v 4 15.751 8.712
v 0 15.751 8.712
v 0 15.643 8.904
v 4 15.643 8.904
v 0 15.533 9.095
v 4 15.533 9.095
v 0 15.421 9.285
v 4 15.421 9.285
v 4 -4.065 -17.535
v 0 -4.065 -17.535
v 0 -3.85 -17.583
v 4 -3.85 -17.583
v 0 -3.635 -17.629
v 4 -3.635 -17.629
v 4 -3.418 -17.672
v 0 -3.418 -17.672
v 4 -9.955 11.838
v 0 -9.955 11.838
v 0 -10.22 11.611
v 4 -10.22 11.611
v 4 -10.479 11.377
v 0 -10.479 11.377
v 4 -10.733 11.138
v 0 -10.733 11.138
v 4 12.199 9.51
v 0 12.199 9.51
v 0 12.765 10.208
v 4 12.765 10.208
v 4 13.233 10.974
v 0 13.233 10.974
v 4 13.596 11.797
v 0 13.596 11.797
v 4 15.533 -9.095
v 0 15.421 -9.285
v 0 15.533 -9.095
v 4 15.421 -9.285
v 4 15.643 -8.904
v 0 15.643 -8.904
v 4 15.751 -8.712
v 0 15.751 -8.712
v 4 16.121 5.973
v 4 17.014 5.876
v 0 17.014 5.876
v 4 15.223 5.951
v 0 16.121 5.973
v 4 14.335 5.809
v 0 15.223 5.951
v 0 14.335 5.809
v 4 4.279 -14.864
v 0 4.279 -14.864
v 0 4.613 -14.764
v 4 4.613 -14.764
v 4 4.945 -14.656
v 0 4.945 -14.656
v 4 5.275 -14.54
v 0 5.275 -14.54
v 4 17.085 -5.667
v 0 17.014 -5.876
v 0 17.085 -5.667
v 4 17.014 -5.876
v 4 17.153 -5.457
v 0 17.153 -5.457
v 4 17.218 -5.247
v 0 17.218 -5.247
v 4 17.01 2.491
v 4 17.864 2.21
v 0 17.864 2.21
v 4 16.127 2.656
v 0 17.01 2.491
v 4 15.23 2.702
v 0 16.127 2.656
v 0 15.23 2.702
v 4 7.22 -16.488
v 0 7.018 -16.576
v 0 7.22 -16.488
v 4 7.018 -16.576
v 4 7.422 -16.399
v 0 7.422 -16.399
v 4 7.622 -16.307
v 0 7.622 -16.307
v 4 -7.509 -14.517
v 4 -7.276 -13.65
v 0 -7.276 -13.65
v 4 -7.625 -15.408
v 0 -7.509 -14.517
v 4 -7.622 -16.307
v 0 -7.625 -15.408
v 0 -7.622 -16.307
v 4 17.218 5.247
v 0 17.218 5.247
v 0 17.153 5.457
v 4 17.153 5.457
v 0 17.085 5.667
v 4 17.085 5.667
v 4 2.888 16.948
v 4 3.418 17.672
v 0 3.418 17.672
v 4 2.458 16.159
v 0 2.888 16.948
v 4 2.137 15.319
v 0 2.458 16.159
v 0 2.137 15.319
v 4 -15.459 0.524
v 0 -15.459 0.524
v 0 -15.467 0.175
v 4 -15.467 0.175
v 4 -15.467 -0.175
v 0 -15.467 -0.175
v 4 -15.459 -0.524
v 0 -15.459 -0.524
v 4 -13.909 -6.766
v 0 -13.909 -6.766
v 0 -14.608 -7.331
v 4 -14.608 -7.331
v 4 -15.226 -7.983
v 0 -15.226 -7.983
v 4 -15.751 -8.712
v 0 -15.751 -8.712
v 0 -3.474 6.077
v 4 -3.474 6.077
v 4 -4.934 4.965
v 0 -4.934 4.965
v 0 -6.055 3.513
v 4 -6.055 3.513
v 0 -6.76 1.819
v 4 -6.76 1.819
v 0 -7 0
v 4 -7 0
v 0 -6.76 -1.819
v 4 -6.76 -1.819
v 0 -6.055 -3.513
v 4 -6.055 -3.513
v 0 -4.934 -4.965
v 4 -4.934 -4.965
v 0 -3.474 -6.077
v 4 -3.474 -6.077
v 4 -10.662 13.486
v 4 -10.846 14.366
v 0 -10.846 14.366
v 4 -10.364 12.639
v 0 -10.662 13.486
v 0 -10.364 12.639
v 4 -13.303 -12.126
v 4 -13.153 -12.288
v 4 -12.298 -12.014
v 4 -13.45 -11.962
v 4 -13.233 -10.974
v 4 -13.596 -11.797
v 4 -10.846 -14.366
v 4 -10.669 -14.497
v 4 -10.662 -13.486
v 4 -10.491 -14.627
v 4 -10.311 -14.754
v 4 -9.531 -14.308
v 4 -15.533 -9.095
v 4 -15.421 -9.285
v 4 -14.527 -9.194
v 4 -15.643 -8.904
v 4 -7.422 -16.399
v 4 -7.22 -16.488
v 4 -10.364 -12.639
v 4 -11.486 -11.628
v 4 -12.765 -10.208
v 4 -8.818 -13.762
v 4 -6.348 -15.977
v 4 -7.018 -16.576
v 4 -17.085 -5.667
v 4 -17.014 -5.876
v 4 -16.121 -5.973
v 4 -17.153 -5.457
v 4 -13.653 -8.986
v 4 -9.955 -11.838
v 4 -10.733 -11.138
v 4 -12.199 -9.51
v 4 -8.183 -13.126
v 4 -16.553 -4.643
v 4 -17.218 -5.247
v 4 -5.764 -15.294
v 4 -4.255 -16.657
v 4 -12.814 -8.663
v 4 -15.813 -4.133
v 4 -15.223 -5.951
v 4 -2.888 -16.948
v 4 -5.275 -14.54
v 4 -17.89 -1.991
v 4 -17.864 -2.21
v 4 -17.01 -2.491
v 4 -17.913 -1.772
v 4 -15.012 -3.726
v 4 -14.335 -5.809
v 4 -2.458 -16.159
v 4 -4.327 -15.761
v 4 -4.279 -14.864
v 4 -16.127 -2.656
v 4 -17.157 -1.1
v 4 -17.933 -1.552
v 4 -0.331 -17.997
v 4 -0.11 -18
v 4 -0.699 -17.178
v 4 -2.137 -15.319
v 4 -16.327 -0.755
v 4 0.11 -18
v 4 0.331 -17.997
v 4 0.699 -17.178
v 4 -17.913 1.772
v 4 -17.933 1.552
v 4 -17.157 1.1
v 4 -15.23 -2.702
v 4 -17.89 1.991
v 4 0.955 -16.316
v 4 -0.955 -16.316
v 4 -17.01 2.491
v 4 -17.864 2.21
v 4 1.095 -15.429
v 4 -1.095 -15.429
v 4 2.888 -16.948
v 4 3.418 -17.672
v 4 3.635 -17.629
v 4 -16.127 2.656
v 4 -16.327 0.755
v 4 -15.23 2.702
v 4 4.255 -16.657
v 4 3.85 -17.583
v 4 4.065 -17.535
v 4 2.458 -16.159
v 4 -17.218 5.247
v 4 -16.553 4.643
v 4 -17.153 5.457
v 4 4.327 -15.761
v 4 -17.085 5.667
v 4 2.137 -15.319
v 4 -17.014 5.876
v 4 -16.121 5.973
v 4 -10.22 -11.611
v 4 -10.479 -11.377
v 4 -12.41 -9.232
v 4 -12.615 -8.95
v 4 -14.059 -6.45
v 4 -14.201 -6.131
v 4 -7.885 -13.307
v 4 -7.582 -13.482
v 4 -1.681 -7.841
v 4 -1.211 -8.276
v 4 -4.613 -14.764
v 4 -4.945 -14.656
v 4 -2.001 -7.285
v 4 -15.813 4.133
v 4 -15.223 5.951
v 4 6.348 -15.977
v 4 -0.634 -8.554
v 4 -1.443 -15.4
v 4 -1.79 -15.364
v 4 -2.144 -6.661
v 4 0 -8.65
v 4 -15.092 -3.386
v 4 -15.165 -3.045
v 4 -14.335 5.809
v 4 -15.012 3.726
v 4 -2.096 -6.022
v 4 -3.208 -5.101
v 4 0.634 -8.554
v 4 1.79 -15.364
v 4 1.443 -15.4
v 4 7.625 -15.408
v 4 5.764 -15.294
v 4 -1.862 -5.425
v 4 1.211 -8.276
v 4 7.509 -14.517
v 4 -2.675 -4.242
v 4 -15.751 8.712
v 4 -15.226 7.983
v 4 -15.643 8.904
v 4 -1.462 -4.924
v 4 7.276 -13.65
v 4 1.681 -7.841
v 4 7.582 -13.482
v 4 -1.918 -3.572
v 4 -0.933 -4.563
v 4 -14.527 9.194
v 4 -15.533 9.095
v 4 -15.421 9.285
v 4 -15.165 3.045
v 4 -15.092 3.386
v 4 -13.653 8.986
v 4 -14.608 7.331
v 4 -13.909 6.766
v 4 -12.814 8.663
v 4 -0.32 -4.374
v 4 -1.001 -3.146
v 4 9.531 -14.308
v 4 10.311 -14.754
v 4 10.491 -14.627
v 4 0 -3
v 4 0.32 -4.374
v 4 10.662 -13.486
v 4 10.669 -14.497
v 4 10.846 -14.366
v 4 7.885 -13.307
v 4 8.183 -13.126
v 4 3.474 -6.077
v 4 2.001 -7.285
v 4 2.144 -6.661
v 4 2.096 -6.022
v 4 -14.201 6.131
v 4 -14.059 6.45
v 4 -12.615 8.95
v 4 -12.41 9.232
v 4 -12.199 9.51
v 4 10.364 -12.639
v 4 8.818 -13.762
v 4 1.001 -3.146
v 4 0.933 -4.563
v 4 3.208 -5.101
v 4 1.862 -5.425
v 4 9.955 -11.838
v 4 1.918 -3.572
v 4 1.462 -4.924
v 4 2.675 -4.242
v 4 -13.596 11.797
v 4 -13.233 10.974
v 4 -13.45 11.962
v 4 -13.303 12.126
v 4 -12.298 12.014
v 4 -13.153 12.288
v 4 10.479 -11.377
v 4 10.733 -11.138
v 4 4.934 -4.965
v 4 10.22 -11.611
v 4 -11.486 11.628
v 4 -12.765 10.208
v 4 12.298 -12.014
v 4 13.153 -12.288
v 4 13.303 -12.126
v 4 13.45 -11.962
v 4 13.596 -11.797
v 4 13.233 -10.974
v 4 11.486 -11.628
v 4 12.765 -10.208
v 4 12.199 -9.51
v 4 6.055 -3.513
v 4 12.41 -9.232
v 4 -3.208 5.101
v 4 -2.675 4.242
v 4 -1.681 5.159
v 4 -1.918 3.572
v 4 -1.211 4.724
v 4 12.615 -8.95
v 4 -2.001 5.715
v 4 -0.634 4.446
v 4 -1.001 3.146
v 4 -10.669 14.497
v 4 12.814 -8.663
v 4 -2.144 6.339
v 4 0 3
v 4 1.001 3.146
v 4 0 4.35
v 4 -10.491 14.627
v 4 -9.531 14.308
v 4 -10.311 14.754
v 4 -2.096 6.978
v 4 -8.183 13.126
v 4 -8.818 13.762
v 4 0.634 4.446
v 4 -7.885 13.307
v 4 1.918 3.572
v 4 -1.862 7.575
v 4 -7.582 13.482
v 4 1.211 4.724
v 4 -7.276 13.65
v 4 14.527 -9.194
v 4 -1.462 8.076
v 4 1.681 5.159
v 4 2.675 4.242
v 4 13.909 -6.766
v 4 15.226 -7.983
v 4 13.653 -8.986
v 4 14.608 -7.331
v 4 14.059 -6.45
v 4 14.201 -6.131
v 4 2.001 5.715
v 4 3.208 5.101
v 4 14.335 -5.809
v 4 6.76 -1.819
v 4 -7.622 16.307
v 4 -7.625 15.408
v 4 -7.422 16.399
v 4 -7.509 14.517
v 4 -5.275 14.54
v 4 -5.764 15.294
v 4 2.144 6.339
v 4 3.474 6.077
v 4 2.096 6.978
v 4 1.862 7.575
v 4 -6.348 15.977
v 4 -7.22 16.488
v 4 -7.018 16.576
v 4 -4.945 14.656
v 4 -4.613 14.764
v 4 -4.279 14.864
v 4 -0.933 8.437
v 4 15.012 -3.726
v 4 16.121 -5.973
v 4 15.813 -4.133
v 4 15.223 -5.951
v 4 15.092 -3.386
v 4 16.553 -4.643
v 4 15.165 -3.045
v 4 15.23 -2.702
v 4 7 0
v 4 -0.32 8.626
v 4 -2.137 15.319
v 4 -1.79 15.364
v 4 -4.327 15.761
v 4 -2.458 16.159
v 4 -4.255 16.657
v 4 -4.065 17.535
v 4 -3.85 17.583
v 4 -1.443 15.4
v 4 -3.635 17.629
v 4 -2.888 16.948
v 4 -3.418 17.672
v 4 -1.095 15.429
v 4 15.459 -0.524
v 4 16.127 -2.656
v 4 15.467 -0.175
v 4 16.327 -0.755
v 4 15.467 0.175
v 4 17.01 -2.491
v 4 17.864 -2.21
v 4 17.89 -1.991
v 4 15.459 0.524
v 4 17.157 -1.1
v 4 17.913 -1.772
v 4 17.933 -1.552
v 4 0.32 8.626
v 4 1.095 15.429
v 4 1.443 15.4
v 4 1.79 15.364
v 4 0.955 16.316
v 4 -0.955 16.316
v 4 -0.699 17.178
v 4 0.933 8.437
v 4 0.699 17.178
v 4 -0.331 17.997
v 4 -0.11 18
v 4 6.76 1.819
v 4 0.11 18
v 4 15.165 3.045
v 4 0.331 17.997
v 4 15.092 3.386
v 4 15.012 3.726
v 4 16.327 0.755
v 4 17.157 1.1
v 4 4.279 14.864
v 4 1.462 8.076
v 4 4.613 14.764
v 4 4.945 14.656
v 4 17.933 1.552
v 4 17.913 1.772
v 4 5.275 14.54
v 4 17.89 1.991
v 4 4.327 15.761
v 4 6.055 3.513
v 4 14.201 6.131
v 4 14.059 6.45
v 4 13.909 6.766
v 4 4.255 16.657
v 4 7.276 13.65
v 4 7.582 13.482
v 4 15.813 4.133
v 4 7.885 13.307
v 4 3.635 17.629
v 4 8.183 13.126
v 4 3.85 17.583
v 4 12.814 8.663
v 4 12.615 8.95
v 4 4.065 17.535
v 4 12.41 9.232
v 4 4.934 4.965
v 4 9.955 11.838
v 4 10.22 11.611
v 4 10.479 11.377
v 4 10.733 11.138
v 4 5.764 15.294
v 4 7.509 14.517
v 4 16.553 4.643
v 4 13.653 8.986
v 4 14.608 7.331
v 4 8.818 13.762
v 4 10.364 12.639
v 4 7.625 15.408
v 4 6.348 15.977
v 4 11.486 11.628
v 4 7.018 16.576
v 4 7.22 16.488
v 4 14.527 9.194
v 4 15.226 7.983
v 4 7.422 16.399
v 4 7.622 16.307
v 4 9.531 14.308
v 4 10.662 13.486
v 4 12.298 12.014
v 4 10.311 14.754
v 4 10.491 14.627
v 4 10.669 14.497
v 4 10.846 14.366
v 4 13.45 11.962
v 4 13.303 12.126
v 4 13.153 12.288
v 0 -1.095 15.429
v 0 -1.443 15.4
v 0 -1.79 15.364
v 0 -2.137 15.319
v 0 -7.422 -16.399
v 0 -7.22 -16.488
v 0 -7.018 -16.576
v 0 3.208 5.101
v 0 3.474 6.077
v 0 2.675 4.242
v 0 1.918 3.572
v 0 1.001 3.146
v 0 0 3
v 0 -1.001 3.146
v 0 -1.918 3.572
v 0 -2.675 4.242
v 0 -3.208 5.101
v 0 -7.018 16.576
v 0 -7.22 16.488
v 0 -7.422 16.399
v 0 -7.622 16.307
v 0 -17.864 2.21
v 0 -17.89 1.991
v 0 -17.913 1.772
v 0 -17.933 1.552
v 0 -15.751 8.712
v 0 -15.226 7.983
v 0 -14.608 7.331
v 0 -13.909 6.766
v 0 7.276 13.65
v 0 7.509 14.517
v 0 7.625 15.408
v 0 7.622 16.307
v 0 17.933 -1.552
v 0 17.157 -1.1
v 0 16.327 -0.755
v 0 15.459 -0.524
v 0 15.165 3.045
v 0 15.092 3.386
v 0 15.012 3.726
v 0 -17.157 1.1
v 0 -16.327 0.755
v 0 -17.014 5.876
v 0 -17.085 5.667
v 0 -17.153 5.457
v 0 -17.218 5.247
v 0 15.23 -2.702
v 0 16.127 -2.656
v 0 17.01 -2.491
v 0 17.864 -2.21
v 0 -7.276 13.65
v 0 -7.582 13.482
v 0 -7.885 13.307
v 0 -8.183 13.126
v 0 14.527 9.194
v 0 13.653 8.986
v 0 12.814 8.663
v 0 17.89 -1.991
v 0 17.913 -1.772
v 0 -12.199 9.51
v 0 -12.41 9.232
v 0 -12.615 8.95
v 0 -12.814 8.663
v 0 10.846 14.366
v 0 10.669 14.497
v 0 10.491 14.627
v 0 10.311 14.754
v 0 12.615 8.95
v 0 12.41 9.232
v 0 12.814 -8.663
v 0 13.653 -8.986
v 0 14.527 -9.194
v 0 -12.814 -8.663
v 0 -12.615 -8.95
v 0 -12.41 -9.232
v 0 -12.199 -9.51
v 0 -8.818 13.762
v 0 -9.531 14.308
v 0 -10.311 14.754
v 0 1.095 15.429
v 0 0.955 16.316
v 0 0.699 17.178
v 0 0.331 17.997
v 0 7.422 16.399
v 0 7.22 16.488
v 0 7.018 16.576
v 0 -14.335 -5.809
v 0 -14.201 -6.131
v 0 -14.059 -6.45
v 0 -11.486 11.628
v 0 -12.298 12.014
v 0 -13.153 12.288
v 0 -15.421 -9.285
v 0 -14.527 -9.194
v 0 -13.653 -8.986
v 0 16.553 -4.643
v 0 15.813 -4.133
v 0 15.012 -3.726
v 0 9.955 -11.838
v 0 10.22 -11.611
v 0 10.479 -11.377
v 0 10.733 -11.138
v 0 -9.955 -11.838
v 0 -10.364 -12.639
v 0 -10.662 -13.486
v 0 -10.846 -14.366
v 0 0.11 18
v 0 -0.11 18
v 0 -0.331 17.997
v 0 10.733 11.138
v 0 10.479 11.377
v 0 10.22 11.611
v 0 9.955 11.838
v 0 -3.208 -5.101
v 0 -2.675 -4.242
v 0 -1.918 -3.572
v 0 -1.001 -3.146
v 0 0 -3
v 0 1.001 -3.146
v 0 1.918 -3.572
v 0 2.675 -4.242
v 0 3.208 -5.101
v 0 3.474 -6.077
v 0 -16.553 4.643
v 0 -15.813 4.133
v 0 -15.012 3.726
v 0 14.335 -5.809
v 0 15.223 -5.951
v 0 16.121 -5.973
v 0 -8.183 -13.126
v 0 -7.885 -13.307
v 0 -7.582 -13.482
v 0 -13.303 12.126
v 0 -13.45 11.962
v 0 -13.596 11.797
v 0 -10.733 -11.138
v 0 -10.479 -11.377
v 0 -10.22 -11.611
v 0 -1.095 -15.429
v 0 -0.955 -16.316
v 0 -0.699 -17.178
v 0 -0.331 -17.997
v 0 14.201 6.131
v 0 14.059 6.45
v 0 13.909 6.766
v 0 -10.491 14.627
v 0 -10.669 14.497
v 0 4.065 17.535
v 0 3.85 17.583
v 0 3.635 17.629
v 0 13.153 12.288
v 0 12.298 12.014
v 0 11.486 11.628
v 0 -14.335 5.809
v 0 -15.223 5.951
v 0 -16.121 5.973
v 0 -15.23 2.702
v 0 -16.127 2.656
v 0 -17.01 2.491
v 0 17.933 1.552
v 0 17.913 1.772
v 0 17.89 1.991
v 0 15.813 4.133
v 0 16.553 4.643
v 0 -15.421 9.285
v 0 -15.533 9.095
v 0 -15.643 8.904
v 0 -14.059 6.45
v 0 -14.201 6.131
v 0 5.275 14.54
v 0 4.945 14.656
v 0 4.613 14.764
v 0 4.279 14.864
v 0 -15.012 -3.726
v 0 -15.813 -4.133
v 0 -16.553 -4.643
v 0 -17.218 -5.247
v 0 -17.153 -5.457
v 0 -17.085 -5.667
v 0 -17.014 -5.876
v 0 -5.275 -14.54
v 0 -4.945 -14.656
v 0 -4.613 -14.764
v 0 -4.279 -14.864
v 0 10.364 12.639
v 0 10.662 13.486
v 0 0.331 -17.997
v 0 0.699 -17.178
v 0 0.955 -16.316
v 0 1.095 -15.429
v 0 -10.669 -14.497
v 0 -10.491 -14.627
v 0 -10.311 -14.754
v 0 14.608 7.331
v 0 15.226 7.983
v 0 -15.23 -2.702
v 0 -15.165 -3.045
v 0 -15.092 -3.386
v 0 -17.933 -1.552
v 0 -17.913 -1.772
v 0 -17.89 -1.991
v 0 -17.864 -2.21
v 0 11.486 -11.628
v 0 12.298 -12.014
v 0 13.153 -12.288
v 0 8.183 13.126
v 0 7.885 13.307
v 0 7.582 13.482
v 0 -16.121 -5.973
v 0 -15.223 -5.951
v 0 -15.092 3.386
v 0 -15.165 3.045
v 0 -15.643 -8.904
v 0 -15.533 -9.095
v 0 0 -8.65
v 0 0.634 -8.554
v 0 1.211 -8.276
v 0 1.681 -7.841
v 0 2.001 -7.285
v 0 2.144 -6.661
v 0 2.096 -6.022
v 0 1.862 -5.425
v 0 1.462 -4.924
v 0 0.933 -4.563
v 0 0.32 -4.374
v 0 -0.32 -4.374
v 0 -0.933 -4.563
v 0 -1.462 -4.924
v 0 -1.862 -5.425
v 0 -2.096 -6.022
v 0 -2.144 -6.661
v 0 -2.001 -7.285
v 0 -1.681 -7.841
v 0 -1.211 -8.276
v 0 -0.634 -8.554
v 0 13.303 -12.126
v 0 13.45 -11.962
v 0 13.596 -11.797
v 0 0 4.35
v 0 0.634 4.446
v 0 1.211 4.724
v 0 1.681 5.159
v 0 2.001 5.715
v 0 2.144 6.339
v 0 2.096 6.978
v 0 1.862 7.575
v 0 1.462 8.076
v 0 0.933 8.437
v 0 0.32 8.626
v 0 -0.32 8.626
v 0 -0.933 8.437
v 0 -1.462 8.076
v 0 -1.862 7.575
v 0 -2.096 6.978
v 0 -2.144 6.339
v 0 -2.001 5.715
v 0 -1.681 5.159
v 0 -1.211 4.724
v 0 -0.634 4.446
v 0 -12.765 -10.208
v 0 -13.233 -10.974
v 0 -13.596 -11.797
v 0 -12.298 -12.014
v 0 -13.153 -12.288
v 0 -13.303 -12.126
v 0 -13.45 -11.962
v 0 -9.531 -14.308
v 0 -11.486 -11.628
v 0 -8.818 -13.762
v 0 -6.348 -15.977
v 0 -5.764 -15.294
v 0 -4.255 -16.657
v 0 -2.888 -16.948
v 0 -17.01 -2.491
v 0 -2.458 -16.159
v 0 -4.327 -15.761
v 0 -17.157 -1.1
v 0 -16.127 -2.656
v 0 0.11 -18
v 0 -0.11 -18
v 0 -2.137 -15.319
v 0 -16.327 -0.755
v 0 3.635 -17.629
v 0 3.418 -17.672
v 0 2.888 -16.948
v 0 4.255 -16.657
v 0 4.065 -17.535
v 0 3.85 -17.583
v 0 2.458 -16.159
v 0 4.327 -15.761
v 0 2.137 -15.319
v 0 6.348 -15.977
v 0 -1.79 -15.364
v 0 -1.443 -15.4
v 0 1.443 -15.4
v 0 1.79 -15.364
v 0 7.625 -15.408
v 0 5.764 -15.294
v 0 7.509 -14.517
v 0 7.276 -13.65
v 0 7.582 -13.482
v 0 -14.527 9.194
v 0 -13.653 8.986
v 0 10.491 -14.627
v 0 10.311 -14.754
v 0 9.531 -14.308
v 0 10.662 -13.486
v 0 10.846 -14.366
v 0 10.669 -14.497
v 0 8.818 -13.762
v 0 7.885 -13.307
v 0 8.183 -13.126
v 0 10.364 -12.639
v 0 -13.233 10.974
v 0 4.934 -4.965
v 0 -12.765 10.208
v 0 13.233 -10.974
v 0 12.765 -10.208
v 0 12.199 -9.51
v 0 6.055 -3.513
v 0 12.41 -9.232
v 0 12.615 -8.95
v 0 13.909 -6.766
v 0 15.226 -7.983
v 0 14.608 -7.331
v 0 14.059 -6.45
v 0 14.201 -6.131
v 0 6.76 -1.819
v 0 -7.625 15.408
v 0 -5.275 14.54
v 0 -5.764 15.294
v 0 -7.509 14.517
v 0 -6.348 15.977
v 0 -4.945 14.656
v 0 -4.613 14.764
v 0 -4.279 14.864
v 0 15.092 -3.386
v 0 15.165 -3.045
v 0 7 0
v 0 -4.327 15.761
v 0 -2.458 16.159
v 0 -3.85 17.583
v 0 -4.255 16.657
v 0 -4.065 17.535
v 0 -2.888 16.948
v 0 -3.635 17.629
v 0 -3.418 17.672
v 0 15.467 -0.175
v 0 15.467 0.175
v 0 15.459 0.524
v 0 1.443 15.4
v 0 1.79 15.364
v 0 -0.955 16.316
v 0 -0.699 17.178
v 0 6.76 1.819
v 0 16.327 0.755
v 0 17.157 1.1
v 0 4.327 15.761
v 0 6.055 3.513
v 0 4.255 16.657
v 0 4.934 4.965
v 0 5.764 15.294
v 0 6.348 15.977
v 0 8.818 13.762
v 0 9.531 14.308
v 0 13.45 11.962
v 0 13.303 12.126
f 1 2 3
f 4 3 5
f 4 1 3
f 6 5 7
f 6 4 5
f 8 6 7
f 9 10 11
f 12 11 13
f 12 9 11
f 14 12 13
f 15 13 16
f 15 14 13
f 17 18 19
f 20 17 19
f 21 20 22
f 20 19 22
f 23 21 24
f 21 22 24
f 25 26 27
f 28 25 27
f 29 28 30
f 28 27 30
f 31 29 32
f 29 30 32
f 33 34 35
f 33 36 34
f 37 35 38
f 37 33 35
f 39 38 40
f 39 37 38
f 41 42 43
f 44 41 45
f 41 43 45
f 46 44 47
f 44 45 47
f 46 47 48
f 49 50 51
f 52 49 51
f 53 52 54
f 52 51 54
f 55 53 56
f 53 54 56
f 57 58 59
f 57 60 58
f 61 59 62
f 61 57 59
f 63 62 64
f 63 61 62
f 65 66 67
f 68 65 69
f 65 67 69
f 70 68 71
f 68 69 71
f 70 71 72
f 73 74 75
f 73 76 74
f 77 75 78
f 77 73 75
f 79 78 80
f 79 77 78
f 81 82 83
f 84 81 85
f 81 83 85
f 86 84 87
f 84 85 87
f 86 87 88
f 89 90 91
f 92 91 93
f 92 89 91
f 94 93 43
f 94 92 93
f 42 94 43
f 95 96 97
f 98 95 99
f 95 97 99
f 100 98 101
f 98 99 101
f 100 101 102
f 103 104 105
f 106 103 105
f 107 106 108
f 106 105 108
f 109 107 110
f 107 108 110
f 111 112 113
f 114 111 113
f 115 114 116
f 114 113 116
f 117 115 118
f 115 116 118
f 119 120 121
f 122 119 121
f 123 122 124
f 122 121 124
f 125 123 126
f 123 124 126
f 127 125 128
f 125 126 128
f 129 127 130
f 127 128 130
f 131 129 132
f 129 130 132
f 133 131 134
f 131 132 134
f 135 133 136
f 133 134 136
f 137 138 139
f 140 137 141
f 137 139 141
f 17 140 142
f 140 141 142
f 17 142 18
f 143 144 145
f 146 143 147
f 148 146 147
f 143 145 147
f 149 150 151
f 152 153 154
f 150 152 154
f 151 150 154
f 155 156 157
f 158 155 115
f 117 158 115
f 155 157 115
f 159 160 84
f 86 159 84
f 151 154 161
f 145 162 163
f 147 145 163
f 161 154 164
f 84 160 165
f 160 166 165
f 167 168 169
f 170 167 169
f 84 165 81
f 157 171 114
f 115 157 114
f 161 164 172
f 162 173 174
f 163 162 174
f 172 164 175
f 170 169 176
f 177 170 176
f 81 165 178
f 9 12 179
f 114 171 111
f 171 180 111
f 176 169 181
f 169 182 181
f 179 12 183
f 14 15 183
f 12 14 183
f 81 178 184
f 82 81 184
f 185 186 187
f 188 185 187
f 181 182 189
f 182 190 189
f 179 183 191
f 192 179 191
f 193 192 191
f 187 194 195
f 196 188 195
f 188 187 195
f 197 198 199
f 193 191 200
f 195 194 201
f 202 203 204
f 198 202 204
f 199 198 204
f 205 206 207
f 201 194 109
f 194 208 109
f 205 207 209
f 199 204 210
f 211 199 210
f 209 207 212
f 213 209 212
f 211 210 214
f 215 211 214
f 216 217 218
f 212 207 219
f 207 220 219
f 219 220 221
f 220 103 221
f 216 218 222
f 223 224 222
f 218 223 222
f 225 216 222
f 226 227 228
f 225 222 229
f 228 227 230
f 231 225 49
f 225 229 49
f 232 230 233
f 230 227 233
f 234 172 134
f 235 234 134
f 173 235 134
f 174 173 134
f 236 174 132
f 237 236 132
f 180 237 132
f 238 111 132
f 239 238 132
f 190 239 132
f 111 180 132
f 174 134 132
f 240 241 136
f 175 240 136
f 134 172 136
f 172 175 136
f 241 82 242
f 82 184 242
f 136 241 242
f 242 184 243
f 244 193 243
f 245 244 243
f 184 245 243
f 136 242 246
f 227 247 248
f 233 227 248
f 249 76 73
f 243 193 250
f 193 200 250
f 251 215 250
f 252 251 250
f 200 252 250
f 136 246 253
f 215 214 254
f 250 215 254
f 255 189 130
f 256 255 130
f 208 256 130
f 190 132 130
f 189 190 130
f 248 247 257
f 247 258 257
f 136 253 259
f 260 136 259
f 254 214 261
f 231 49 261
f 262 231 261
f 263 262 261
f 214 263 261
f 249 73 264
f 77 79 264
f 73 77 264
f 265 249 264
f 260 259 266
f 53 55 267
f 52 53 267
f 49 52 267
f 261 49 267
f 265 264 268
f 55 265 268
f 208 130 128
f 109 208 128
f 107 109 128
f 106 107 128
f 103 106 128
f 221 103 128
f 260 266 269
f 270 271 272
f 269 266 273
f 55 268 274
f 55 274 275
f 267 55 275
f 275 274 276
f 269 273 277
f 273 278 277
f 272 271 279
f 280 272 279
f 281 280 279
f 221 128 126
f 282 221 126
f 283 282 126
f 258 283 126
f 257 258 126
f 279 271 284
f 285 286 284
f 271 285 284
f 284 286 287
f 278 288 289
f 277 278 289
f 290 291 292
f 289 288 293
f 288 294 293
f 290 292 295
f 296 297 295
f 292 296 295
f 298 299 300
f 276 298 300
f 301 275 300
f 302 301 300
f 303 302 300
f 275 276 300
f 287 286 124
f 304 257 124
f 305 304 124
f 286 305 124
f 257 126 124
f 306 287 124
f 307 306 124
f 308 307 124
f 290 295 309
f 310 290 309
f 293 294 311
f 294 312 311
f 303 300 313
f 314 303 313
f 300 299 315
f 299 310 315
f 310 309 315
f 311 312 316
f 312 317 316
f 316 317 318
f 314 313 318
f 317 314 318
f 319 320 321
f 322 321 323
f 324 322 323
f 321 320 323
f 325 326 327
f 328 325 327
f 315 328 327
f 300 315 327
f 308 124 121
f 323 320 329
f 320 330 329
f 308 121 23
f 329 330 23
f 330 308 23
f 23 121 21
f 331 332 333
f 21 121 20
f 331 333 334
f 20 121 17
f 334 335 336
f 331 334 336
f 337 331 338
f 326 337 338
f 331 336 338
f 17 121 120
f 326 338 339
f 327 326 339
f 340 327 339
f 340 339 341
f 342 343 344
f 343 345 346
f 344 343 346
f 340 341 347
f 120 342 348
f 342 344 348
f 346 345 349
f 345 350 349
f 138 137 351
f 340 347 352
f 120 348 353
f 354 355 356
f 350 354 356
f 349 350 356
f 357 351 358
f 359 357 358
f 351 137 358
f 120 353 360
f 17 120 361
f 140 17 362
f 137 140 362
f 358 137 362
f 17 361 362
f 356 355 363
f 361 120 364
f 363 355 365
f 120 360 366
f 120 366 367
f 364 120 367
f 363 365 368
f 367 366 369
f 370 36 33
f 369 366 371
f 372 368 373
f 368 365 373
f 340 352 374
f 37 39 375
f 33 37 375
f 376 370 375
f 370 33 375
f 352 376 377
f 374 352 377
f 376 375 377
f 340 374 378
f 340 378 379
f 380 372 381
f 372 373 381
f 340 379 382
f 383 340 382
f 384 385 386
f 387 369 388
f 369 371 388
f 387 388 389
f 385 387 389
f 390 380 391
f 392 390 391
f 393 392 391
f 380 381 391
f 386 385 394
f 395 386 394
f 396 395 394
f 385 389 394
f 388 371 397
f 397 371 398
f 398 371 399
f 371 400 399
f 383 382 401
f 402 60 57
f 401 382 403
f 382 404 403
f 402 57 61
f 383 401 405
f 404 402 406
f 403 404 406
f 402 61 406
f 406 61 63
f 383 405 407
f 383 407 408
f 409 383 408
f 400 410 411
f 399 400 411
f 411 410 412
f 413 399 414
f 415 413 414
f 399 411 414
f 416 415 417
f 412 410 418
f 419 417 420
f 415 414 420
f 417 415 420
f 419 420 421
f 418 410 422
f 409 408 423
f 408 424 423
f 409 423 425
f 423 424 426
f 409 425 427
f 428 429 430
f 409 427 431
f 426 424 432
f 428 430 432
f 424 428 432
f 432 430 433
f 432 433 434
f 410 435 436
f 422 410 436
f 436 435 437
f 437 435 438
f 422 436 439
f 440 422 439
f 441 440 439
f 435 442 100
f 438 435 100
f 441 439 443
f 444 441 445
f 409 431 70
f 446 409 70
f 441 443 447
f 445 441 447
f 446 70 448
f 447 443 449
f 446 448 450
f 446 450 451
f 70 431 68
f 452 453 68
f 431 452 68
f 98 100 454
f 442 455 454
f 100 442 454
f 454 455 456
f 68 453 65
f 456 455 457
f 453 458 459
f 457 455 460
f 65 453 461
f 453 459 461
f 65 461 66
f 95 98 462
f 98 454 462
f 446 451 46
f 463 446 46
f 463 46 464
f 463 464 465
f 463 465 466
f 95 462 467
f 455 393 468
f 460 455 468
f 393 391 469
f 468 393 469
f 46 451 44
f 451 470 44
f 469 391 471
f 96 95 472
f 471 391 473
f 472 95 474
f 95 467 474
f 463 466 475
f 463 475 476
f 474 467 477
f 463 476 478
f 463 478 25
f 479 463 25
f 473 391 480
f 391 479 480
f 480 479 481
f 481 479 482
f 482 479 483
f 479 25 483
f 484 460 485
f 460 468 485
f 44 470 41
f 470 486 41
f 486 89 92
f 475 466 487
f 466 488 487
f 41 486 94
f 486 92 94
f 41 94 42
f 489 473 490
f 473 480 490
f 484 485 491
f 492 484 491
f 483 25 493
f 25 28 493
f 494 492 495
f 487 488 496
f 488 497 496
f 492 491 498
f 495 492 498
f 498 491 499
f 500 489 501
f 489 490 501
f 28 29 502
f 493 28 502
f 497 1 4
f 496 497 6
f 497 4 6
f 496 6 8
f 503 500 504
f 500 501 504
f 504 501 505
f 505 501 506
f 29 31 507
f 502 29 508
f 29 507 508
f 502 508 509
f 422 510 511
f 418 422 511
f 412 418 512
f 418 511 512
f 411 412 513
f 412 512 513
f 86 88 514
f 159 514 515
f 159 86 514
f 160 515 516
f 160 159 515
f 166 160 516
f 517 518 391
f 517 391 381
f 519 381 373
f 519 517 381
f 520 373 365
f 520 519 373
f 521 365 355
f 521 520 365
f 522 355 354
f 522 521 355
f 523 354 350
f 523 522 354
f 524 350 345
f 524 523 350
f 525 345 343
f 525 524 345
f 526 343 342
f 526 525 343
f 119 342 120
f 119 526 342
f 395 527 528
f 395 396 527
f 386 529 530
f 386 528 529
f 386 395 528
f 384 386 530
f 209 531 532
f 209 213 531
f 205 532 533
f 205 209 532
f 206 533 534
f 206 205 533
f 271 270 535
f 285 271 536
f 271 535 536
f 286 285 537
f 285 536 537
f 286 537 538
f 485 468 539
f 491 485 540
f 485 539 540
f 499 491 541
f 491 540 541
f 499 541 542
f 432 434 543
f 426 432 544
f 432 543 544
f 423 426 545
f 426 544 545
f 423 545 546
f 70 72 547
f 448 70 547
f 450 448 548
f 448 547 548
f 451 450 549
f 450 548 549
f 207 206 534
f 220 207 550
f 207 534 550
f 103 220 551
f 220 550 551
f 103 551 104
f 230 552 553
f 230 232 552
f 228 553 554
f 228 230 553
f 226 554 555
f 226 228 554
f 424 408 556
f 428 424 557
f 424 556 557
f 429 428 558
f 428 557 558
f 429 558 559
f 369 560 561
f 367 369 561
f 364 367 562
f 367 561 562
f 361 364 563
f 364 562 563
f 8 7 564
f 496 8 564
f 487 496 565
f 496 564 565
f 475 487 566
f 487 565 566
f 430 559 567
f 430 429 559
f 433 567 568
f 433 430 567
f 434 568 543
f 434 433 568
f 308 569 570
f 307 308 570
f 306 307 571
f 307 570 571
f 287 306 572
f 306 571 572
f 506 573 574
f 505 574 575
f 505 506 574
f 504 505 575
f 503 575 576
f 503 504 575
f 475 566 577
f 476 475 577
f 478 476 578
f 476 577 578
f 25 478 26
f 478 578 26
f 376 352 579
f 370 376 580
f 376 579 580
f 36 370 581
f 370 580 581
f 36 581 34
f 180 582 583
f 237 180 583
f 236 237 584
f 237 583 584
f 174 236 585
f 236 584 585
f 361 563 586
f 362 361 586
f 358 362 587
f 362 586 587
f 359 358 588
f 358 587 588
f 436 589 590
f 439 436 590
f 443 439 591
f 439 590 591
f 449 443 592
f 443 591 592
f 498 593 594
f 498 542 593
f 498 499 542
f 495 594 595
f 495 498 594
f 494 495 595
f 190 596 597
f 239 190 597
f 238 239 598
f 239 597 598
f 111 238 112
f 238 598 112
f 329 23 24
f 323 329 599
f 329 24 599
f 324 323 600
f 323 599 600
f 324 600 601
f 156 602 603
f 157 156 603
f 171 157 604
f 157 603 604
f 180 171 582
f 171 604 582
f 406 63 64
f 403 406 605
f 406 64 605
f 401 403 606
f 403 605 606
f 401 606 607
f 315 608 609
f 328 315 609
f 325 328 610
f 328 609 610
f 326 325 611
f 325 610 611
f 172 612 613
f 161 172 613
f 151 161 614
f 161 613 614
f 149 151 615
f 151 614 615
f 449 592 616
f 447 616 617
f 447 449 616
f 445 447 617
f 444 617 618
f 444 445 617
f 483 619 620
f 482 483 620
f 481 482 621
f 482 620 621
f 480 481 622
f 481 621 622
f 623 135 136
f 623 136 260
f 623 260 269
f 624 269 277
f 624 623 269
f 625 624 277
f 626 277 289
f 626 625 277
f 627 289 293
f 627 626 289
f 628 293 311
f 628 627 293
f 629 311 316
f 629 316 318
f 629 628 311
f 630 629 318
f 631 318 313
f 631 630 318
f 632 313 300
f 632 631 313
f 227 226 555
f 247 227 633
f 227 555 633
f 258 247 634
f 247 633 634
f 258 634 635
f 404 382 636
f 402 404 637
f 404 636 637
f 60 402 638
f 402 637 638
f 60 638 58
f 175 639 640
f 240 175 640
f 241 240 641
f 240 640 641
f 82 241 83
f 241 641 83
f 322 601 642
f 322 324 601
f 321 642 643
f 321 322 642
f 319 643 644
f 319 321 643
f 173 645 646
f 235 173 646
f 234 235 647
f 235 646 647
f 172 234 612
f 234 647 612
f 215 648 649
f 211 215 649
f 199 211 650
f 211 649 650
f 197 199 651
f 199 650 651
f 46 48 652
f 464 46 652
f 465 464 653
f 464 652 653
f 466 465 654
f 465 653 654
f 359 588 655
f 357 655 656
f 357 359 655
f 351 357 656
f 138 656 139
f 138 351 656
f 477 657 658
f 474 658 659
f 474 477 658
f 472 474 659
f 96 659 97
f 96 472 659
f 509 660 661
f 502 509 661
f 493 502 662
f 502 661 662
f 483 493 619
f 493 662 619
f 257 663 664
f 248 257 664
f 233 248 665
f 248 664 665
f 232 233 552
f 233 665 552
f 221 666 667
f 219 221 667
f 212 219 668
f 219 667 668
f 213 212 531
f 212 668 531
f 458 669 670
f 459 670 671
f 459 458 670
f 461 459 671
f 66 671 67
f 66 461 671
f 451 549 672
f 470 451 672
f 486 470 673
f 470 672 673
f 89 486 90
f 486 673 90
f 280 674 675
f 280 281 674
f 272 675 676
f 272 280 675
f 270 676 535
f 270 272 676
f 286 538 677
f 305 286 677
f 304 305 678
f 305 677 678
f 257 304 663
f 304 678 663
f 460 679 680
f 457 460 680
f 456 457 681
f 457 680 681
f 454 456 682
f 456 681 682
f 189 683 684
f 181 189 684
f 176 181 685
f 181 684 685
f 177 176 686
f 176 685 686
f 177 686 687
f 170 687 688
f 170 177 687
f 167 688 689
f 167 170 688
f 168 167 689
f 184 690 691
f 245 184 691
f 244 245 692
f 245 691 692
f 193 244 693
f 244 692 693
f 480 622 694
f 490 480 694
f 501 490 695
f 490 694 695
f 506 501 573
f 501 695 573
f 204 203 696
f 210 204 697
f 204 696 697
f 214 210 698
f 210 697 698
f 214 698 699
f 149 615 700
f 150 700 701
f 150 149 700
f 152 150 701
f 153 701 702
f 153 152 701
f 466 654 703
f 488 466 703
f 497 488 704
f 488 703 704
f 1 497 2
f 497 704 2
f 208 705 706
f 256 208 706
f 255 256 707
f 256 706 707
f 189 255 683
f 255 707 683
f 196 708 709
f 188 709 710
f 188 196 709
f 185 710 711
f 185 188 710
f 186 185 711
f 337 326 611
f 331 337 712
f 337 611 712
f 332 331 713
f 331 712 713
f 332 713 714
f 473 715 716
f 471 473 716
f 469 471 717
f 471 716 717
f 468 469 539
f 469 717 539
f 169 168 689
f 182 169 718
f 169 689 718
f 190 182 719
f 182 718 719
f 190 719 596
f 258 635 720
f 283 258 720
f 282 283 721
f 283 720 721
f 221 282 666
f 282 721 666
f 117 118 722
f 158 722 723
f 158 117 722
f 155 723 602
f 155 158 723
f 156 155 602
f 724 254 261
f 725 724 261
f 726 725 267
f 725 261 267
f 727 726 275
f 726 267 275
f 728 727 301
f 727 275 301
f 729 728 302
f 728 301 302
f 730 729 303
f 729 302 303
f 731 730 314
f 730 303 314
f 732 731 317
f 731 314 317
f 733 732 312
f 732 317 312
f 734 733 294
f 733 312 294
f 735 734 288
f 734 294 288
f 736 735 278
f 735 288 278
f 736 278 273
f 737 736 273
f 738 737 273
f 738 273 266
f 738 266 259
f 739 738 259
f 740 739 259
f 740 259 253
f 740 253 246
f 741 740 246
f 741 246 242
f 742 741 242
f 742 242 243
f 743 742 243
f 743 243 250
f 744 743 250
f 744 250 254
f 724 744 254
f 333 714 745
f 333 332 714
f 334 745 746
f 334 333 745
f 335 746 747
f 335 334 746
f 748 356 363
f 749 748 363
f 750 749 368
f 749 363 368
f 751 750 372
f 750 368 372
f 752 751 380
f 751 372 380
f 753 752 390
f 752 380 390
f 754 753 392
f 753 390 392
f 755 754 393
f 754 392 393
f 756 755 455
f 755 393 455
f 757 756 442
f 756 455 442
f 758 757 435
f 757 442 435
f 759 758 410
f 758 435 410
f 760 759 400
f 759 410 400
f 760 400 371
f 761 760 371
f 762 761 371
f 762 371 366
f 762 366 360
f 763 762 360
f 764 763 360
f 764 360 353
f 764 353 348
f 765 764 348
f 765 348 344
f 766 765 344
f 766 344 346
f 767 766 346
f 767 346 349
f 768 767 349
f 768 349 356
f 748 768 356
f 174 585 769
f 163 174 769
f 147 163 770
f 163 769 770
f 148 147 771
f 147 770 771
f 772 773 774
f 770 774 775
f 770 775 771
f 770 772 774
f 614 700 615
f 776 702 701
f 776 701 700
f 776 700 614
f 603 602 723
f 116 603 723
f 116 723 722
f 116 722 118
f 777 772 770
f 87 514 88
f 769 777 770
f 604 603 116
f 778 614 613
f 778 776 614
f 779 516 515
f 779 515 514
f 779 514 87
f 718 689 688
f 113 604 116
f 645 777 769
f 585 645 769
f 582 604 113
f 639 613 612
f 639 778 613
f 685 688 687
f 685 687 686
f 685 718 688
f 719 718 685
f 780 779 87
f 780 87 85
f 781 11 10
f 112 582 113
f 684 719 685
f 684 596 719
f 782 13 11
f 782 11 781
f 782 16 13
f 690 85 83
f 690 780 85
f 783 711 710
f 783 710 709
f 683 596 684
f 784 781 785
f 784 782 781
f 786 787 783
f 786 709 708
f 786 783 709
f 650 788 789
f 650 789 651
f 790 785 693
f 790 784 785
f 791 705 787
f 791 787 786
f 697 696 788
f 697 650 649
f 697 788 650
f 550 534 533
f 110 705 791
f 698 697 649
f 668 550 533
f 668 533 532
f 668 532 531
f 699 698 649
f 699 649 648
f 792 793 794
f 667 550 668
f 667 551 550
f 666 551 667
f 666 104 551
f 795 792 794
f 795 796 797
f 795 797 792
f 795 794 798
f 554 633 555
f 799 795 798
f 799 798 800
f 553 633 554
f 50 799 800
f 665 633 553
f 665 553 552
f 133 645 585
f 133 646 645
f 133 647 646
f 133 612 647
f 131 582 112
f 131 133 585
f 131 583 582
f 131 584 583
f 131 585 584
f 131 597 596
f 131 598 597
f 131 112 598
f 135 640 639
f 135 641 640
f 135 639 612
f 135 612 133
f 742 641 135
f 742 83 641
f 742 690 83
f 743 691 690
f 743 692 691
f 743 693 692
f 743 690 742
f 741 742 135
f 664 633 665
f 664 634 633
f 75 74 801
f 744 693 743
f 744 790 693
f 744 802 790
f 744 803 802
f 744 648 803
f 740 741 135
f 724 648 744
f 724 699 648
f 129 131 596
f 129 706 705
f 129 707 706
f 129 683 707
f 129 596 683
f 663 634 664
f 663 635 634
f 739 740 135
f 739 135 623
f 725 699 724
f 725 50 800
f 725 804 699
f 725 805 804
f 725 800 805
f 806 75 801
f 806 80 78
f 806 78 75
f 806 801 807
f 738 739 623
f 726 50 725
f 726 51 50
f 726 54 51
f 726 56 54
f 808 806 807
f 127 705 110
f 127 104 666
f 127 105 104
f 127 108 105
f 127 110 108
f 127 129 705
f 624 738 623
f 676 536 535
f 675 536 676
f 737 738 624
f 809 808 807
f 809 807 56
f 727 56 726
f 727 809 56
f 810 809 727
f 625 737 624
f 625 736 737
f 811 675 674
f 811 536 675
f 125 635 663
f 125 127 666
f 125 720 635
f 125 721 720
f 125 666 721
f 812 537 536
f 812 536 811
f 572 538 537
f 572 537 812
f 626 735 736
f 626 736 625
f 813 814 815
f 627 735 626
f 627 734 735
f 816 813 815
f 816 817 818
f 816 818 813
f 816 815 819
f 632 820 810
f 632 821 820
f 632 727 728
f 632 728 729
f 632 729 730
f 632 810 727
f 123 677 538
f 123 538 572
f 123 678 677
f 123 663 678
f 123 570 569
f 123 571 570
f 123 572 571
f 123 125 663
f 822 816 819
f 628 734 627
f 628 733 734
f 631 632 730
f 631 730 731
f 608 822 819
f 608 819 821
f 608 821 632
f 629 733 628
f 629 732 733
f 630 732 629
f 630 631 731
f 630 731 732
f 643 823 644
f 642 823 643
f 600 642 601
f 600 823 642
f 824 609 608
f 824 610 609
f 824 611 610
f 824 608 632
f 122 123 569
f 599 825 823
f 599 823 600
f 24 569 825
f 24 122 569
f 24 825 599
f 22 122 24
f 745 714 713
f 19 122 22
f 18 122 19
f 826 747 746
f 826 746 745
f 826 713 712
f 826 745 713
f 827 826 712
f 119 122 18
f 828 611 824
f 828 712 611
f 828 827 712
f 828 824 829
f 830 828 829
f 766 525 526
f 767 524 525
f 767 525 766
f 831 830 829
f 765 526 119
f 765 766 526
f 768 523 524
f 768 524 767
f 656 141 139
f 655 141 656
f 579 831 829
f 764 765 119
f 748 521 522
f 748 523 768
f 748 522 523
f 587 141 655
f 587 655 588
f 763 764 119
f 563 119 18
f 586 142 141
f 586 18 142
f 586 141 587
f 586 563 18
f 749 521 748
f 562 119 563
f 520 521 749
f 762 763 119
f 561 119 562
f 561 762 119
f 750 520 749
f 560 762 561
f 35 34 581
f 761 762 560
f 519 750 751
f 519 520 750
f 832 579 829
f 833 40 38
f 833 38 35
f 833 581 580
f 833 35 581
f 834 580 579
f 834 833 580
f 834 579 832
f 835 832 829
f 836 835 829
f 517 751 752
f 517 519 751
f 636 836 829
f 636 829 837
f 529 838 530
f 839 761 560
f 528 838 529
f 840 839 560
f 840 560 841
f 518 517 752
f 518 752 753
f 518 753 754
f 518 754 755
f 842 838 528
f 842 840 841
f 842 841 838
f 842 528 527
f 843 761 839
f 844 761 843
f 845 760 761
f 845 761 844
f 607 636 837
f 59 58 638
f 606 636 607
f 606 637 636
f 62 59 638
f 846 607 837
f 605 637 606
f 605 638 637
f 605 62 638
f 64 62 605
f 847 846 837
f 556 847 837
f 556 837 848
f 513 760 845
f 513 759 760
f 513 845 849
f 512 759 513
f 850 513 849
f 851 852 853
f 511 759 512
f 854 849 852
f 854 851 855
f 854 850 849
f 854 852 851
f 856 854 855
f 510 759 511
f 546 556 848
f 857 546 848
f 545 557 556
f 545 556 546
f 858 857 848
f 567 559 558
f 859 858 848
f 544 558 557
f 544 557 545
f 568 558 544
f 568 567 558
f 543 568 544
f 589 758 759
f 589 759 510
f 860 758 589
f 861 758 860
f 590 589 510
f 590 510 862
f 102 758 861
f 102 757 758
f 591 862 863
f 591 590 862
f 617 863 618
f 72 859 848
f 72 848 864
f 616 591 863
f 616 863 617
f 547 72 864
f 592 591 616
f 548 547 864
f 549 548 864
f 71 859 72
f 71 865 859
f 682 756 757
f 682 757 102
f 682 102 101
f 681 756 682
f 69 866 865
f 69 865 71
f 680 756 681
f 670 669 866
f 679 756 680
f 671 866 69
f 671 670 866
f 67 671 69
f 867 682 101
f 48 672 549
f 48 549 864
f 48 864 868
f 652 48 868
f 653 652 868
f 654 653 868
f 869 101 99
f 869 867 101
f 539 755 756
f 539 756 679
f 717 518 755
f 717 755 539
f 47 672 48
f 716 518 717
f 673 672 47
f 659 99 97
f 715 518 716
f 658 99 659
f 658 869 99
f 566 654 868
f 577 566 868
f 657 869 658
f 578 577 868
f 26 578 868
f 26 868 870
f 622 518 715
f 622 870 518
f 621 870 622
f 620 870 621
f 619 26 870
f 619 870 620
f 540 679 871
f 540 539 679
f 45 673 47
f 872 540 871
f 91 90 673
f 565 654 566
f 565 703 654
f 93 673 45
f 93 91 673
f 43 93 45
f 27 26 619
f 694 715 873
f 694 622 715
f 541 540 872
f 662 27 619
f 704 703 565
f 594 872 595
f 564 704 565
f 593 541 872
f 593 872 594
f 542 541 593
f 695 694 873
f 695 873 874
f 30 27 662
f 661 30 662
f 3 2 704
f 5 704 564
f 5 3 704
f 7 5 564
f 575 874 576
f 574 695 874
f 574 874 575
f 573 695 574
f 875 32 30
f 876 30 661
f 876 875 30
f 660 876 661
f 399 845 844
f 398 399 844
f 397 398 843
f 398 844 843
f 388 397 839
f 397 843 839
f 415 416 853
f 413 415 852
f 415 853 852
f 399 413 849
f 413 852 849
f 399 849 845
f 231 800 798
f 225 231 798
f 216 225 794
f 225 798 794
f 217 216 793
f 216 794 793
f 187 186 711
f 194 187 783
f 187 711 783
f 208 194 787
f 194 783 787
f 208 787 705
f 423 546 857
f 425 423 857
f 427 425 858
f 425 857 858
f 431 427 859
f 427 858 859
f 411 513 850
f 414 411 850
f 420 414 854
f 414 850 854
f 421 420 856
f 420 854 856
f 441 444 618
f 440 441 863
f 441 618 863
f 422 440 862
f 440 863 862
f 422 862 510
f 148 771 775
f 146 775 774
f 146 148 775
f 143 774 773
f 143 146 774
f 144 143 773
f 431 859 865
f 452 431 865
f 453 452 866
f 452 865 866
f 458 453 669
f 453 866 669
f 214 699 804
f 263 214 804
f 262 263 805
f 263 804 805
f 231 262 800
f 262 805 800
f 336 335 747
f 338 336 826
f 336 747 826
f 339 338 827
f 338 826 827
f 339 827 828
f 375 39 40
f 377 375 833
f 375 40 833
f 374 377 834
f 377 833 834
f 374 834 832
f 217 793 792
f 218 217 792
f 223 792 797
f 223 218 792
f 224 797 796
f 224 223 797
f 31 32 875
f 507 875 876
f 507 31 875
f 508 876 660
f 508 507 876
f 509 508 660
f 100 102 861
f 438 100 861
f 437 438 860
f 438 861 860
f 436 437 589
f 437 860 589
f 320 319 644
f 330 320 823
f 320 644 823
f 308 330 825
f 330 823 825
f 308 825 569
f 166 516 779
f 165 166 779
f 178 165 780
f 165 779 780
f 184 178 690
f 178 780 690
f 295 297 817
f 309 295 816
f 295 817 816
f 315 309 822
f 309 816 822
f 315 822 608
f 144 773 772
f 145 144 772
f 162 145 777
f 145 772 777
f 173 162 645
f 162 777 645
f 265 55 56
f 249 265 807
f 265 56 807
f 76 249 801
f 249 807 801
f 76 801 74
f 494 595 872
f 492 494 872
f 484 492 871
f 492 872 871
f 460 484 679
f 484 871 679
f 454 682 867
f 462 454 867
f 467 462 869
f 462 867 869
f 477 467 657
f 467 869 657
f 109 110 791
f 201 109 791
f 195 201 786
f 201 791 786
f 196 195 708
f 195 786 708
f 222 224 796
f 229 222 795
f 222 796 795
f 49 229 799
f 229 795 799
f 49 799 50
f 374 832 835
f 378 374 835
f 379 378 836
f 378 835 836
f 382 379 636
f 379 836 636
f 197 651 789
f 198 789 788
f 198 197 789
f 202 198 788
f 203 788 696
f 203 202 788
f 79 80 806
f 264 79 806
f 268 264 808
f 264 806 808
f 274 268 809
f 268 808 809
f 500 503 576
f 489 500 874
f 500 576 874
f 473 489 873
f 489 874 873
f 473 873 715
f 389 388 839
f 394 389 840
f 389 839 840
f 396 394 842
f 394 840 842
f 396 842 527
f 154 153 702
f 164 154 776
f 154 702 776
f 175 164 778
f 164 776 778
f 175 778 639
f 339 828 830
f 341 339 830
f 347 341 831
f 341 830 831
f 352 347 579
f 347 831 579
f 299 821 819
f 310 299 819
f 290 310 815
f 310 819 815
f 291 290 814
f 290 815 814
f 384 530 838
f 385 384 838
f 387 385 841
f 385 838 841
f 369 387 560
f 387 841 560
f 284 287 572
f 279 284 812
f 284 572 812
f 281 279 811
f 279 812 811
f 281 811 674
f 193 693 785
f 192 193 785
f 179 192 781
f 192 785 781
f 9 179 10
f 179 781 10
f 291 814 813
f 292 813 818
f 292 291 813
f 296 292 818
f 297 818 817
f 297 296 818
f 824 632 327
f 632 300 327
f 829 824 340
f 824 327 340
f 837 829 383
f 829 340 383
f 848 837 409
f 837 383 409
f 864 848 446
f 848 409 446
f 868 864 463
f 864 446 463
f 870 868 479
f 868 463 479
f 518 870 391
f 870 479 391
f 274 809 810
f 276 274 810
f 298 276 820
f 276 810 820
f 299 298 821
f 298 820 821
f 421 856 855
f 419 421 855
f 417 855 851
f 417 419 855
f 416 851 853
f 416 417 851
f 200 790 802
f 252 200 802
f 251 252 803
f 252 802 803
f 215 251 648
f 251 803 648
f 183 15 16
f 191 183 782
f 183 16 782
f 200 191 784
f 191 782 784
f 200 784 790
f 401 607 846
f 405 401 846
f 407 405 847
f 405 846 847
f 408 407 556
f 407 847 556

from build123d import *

# Parameters (mm, degrees)
BASPROSKE_W          = 4
BASPROSKE_H          = 18
TOOTHCUT_DEPTH       = 26.768197453
TEETHCUTS_COUNT      = 30
TEETHCUTS_ANGLE      = 348
BORSKE_R             = 7
BORE_DEPTH           = 50.0000508
SKETCH2_R            = 3.5
BOSS_EXTRUDE1_DEPTH  = 4
M4_CLEARANCE_HOLE1_D = 4.3


with BuildPart() as part:
    # BasProSke → Base-Revolve (revolve)
    with BuildSketch(Plane(origin=(0, 0, 0), x_dir=(1, 0, 0), z_dir=(0, 1, 0)), mode=Mode.PRIVATE) as base_revolve_sk:
        with Locations((2, 9)):
            Rectangle(BASPROSKE_W, BASPROSKE_H)
    revolve(base_revolve_sk.sketch.rotate(Axis((-10, 0, 0), (1, 0, 0)), 180), axis=Axis((-10, 0, 0), (1, 0, 0)))

    # TooCutSke → ToothCut (cut, through all)
    with BuildSketch(Plane(origin=(0, 0, 0), x_dir=(0, 0, -1), z_dir=(1, 0, 0))):
        with BuildLine():
            ThreePointArc((0.523521522, 15.458887906), (0, 15.46775), (-0.523521522, 15.458887906))
            ThreePointArc((-0.523521522, 15.458887906), (-0.919551256, 16.760900189), (-1.568701479, 17.957010353))
            ThreePointArc((-1.568701479, 17.957010353), (0, 18.0254), (1.568701479, 17.957010353))
            ThreePointArc((1.568701479, 17.957010353), (0.919551256, 16.760900189), (0.523521522, 15.458887906))
        make_face()
    toothcut = extrude(amount=TOOTHCUT_DEPTH, mode=Mode.SUBTRACT)

    # TeethCuts: ToothCut ×30 about axis
    teethcuts_axis = Axis((-10, 0, 0), (1, 0, 0))
    for i in range(1, TEETHCUTS_COUNT):
        add(toothcut.rotate(teethcuts_axis, i * TEETHCUTS_ANGLE / (TEETHCUTS_COUNT - 1)), mode=Mode.SUBTRACT)

    # BorSke → Bore (cut, symmetric)
    with BuildSketch(Plane(origin=(0, 0, 0), x_dir=(0, 0, -1), z_dir=(1, 0, 0))):
        with Locations(Location((0, 0, 0), (0, 0, 180))):
            Circle(BORSKE_R)
    extrude(amount=BORE_DEPTH, both=True, mode=Mode.SUBTRACT)

    # Sketch2 → Boss-Extrude1 (add)
    with BuildSketch(Plane.ZY):
        with Locations((-6.5, 0)):
            Circle(SKETCH2_R)
        with Locations((6.5, 0)):
            Circle(SKETCH2_R)
    extrude(amount=-BOSS_EXTRUDE1_DEPTH)

    # M4 Clearance Hole1 (through all)
    with Locations(Plane.ZY):
        with Locations((-6.5, 0), (6.5, 0)):
            Hole(M4_CLEARANCE_HOLE1_D / 2)


solid = part.part
